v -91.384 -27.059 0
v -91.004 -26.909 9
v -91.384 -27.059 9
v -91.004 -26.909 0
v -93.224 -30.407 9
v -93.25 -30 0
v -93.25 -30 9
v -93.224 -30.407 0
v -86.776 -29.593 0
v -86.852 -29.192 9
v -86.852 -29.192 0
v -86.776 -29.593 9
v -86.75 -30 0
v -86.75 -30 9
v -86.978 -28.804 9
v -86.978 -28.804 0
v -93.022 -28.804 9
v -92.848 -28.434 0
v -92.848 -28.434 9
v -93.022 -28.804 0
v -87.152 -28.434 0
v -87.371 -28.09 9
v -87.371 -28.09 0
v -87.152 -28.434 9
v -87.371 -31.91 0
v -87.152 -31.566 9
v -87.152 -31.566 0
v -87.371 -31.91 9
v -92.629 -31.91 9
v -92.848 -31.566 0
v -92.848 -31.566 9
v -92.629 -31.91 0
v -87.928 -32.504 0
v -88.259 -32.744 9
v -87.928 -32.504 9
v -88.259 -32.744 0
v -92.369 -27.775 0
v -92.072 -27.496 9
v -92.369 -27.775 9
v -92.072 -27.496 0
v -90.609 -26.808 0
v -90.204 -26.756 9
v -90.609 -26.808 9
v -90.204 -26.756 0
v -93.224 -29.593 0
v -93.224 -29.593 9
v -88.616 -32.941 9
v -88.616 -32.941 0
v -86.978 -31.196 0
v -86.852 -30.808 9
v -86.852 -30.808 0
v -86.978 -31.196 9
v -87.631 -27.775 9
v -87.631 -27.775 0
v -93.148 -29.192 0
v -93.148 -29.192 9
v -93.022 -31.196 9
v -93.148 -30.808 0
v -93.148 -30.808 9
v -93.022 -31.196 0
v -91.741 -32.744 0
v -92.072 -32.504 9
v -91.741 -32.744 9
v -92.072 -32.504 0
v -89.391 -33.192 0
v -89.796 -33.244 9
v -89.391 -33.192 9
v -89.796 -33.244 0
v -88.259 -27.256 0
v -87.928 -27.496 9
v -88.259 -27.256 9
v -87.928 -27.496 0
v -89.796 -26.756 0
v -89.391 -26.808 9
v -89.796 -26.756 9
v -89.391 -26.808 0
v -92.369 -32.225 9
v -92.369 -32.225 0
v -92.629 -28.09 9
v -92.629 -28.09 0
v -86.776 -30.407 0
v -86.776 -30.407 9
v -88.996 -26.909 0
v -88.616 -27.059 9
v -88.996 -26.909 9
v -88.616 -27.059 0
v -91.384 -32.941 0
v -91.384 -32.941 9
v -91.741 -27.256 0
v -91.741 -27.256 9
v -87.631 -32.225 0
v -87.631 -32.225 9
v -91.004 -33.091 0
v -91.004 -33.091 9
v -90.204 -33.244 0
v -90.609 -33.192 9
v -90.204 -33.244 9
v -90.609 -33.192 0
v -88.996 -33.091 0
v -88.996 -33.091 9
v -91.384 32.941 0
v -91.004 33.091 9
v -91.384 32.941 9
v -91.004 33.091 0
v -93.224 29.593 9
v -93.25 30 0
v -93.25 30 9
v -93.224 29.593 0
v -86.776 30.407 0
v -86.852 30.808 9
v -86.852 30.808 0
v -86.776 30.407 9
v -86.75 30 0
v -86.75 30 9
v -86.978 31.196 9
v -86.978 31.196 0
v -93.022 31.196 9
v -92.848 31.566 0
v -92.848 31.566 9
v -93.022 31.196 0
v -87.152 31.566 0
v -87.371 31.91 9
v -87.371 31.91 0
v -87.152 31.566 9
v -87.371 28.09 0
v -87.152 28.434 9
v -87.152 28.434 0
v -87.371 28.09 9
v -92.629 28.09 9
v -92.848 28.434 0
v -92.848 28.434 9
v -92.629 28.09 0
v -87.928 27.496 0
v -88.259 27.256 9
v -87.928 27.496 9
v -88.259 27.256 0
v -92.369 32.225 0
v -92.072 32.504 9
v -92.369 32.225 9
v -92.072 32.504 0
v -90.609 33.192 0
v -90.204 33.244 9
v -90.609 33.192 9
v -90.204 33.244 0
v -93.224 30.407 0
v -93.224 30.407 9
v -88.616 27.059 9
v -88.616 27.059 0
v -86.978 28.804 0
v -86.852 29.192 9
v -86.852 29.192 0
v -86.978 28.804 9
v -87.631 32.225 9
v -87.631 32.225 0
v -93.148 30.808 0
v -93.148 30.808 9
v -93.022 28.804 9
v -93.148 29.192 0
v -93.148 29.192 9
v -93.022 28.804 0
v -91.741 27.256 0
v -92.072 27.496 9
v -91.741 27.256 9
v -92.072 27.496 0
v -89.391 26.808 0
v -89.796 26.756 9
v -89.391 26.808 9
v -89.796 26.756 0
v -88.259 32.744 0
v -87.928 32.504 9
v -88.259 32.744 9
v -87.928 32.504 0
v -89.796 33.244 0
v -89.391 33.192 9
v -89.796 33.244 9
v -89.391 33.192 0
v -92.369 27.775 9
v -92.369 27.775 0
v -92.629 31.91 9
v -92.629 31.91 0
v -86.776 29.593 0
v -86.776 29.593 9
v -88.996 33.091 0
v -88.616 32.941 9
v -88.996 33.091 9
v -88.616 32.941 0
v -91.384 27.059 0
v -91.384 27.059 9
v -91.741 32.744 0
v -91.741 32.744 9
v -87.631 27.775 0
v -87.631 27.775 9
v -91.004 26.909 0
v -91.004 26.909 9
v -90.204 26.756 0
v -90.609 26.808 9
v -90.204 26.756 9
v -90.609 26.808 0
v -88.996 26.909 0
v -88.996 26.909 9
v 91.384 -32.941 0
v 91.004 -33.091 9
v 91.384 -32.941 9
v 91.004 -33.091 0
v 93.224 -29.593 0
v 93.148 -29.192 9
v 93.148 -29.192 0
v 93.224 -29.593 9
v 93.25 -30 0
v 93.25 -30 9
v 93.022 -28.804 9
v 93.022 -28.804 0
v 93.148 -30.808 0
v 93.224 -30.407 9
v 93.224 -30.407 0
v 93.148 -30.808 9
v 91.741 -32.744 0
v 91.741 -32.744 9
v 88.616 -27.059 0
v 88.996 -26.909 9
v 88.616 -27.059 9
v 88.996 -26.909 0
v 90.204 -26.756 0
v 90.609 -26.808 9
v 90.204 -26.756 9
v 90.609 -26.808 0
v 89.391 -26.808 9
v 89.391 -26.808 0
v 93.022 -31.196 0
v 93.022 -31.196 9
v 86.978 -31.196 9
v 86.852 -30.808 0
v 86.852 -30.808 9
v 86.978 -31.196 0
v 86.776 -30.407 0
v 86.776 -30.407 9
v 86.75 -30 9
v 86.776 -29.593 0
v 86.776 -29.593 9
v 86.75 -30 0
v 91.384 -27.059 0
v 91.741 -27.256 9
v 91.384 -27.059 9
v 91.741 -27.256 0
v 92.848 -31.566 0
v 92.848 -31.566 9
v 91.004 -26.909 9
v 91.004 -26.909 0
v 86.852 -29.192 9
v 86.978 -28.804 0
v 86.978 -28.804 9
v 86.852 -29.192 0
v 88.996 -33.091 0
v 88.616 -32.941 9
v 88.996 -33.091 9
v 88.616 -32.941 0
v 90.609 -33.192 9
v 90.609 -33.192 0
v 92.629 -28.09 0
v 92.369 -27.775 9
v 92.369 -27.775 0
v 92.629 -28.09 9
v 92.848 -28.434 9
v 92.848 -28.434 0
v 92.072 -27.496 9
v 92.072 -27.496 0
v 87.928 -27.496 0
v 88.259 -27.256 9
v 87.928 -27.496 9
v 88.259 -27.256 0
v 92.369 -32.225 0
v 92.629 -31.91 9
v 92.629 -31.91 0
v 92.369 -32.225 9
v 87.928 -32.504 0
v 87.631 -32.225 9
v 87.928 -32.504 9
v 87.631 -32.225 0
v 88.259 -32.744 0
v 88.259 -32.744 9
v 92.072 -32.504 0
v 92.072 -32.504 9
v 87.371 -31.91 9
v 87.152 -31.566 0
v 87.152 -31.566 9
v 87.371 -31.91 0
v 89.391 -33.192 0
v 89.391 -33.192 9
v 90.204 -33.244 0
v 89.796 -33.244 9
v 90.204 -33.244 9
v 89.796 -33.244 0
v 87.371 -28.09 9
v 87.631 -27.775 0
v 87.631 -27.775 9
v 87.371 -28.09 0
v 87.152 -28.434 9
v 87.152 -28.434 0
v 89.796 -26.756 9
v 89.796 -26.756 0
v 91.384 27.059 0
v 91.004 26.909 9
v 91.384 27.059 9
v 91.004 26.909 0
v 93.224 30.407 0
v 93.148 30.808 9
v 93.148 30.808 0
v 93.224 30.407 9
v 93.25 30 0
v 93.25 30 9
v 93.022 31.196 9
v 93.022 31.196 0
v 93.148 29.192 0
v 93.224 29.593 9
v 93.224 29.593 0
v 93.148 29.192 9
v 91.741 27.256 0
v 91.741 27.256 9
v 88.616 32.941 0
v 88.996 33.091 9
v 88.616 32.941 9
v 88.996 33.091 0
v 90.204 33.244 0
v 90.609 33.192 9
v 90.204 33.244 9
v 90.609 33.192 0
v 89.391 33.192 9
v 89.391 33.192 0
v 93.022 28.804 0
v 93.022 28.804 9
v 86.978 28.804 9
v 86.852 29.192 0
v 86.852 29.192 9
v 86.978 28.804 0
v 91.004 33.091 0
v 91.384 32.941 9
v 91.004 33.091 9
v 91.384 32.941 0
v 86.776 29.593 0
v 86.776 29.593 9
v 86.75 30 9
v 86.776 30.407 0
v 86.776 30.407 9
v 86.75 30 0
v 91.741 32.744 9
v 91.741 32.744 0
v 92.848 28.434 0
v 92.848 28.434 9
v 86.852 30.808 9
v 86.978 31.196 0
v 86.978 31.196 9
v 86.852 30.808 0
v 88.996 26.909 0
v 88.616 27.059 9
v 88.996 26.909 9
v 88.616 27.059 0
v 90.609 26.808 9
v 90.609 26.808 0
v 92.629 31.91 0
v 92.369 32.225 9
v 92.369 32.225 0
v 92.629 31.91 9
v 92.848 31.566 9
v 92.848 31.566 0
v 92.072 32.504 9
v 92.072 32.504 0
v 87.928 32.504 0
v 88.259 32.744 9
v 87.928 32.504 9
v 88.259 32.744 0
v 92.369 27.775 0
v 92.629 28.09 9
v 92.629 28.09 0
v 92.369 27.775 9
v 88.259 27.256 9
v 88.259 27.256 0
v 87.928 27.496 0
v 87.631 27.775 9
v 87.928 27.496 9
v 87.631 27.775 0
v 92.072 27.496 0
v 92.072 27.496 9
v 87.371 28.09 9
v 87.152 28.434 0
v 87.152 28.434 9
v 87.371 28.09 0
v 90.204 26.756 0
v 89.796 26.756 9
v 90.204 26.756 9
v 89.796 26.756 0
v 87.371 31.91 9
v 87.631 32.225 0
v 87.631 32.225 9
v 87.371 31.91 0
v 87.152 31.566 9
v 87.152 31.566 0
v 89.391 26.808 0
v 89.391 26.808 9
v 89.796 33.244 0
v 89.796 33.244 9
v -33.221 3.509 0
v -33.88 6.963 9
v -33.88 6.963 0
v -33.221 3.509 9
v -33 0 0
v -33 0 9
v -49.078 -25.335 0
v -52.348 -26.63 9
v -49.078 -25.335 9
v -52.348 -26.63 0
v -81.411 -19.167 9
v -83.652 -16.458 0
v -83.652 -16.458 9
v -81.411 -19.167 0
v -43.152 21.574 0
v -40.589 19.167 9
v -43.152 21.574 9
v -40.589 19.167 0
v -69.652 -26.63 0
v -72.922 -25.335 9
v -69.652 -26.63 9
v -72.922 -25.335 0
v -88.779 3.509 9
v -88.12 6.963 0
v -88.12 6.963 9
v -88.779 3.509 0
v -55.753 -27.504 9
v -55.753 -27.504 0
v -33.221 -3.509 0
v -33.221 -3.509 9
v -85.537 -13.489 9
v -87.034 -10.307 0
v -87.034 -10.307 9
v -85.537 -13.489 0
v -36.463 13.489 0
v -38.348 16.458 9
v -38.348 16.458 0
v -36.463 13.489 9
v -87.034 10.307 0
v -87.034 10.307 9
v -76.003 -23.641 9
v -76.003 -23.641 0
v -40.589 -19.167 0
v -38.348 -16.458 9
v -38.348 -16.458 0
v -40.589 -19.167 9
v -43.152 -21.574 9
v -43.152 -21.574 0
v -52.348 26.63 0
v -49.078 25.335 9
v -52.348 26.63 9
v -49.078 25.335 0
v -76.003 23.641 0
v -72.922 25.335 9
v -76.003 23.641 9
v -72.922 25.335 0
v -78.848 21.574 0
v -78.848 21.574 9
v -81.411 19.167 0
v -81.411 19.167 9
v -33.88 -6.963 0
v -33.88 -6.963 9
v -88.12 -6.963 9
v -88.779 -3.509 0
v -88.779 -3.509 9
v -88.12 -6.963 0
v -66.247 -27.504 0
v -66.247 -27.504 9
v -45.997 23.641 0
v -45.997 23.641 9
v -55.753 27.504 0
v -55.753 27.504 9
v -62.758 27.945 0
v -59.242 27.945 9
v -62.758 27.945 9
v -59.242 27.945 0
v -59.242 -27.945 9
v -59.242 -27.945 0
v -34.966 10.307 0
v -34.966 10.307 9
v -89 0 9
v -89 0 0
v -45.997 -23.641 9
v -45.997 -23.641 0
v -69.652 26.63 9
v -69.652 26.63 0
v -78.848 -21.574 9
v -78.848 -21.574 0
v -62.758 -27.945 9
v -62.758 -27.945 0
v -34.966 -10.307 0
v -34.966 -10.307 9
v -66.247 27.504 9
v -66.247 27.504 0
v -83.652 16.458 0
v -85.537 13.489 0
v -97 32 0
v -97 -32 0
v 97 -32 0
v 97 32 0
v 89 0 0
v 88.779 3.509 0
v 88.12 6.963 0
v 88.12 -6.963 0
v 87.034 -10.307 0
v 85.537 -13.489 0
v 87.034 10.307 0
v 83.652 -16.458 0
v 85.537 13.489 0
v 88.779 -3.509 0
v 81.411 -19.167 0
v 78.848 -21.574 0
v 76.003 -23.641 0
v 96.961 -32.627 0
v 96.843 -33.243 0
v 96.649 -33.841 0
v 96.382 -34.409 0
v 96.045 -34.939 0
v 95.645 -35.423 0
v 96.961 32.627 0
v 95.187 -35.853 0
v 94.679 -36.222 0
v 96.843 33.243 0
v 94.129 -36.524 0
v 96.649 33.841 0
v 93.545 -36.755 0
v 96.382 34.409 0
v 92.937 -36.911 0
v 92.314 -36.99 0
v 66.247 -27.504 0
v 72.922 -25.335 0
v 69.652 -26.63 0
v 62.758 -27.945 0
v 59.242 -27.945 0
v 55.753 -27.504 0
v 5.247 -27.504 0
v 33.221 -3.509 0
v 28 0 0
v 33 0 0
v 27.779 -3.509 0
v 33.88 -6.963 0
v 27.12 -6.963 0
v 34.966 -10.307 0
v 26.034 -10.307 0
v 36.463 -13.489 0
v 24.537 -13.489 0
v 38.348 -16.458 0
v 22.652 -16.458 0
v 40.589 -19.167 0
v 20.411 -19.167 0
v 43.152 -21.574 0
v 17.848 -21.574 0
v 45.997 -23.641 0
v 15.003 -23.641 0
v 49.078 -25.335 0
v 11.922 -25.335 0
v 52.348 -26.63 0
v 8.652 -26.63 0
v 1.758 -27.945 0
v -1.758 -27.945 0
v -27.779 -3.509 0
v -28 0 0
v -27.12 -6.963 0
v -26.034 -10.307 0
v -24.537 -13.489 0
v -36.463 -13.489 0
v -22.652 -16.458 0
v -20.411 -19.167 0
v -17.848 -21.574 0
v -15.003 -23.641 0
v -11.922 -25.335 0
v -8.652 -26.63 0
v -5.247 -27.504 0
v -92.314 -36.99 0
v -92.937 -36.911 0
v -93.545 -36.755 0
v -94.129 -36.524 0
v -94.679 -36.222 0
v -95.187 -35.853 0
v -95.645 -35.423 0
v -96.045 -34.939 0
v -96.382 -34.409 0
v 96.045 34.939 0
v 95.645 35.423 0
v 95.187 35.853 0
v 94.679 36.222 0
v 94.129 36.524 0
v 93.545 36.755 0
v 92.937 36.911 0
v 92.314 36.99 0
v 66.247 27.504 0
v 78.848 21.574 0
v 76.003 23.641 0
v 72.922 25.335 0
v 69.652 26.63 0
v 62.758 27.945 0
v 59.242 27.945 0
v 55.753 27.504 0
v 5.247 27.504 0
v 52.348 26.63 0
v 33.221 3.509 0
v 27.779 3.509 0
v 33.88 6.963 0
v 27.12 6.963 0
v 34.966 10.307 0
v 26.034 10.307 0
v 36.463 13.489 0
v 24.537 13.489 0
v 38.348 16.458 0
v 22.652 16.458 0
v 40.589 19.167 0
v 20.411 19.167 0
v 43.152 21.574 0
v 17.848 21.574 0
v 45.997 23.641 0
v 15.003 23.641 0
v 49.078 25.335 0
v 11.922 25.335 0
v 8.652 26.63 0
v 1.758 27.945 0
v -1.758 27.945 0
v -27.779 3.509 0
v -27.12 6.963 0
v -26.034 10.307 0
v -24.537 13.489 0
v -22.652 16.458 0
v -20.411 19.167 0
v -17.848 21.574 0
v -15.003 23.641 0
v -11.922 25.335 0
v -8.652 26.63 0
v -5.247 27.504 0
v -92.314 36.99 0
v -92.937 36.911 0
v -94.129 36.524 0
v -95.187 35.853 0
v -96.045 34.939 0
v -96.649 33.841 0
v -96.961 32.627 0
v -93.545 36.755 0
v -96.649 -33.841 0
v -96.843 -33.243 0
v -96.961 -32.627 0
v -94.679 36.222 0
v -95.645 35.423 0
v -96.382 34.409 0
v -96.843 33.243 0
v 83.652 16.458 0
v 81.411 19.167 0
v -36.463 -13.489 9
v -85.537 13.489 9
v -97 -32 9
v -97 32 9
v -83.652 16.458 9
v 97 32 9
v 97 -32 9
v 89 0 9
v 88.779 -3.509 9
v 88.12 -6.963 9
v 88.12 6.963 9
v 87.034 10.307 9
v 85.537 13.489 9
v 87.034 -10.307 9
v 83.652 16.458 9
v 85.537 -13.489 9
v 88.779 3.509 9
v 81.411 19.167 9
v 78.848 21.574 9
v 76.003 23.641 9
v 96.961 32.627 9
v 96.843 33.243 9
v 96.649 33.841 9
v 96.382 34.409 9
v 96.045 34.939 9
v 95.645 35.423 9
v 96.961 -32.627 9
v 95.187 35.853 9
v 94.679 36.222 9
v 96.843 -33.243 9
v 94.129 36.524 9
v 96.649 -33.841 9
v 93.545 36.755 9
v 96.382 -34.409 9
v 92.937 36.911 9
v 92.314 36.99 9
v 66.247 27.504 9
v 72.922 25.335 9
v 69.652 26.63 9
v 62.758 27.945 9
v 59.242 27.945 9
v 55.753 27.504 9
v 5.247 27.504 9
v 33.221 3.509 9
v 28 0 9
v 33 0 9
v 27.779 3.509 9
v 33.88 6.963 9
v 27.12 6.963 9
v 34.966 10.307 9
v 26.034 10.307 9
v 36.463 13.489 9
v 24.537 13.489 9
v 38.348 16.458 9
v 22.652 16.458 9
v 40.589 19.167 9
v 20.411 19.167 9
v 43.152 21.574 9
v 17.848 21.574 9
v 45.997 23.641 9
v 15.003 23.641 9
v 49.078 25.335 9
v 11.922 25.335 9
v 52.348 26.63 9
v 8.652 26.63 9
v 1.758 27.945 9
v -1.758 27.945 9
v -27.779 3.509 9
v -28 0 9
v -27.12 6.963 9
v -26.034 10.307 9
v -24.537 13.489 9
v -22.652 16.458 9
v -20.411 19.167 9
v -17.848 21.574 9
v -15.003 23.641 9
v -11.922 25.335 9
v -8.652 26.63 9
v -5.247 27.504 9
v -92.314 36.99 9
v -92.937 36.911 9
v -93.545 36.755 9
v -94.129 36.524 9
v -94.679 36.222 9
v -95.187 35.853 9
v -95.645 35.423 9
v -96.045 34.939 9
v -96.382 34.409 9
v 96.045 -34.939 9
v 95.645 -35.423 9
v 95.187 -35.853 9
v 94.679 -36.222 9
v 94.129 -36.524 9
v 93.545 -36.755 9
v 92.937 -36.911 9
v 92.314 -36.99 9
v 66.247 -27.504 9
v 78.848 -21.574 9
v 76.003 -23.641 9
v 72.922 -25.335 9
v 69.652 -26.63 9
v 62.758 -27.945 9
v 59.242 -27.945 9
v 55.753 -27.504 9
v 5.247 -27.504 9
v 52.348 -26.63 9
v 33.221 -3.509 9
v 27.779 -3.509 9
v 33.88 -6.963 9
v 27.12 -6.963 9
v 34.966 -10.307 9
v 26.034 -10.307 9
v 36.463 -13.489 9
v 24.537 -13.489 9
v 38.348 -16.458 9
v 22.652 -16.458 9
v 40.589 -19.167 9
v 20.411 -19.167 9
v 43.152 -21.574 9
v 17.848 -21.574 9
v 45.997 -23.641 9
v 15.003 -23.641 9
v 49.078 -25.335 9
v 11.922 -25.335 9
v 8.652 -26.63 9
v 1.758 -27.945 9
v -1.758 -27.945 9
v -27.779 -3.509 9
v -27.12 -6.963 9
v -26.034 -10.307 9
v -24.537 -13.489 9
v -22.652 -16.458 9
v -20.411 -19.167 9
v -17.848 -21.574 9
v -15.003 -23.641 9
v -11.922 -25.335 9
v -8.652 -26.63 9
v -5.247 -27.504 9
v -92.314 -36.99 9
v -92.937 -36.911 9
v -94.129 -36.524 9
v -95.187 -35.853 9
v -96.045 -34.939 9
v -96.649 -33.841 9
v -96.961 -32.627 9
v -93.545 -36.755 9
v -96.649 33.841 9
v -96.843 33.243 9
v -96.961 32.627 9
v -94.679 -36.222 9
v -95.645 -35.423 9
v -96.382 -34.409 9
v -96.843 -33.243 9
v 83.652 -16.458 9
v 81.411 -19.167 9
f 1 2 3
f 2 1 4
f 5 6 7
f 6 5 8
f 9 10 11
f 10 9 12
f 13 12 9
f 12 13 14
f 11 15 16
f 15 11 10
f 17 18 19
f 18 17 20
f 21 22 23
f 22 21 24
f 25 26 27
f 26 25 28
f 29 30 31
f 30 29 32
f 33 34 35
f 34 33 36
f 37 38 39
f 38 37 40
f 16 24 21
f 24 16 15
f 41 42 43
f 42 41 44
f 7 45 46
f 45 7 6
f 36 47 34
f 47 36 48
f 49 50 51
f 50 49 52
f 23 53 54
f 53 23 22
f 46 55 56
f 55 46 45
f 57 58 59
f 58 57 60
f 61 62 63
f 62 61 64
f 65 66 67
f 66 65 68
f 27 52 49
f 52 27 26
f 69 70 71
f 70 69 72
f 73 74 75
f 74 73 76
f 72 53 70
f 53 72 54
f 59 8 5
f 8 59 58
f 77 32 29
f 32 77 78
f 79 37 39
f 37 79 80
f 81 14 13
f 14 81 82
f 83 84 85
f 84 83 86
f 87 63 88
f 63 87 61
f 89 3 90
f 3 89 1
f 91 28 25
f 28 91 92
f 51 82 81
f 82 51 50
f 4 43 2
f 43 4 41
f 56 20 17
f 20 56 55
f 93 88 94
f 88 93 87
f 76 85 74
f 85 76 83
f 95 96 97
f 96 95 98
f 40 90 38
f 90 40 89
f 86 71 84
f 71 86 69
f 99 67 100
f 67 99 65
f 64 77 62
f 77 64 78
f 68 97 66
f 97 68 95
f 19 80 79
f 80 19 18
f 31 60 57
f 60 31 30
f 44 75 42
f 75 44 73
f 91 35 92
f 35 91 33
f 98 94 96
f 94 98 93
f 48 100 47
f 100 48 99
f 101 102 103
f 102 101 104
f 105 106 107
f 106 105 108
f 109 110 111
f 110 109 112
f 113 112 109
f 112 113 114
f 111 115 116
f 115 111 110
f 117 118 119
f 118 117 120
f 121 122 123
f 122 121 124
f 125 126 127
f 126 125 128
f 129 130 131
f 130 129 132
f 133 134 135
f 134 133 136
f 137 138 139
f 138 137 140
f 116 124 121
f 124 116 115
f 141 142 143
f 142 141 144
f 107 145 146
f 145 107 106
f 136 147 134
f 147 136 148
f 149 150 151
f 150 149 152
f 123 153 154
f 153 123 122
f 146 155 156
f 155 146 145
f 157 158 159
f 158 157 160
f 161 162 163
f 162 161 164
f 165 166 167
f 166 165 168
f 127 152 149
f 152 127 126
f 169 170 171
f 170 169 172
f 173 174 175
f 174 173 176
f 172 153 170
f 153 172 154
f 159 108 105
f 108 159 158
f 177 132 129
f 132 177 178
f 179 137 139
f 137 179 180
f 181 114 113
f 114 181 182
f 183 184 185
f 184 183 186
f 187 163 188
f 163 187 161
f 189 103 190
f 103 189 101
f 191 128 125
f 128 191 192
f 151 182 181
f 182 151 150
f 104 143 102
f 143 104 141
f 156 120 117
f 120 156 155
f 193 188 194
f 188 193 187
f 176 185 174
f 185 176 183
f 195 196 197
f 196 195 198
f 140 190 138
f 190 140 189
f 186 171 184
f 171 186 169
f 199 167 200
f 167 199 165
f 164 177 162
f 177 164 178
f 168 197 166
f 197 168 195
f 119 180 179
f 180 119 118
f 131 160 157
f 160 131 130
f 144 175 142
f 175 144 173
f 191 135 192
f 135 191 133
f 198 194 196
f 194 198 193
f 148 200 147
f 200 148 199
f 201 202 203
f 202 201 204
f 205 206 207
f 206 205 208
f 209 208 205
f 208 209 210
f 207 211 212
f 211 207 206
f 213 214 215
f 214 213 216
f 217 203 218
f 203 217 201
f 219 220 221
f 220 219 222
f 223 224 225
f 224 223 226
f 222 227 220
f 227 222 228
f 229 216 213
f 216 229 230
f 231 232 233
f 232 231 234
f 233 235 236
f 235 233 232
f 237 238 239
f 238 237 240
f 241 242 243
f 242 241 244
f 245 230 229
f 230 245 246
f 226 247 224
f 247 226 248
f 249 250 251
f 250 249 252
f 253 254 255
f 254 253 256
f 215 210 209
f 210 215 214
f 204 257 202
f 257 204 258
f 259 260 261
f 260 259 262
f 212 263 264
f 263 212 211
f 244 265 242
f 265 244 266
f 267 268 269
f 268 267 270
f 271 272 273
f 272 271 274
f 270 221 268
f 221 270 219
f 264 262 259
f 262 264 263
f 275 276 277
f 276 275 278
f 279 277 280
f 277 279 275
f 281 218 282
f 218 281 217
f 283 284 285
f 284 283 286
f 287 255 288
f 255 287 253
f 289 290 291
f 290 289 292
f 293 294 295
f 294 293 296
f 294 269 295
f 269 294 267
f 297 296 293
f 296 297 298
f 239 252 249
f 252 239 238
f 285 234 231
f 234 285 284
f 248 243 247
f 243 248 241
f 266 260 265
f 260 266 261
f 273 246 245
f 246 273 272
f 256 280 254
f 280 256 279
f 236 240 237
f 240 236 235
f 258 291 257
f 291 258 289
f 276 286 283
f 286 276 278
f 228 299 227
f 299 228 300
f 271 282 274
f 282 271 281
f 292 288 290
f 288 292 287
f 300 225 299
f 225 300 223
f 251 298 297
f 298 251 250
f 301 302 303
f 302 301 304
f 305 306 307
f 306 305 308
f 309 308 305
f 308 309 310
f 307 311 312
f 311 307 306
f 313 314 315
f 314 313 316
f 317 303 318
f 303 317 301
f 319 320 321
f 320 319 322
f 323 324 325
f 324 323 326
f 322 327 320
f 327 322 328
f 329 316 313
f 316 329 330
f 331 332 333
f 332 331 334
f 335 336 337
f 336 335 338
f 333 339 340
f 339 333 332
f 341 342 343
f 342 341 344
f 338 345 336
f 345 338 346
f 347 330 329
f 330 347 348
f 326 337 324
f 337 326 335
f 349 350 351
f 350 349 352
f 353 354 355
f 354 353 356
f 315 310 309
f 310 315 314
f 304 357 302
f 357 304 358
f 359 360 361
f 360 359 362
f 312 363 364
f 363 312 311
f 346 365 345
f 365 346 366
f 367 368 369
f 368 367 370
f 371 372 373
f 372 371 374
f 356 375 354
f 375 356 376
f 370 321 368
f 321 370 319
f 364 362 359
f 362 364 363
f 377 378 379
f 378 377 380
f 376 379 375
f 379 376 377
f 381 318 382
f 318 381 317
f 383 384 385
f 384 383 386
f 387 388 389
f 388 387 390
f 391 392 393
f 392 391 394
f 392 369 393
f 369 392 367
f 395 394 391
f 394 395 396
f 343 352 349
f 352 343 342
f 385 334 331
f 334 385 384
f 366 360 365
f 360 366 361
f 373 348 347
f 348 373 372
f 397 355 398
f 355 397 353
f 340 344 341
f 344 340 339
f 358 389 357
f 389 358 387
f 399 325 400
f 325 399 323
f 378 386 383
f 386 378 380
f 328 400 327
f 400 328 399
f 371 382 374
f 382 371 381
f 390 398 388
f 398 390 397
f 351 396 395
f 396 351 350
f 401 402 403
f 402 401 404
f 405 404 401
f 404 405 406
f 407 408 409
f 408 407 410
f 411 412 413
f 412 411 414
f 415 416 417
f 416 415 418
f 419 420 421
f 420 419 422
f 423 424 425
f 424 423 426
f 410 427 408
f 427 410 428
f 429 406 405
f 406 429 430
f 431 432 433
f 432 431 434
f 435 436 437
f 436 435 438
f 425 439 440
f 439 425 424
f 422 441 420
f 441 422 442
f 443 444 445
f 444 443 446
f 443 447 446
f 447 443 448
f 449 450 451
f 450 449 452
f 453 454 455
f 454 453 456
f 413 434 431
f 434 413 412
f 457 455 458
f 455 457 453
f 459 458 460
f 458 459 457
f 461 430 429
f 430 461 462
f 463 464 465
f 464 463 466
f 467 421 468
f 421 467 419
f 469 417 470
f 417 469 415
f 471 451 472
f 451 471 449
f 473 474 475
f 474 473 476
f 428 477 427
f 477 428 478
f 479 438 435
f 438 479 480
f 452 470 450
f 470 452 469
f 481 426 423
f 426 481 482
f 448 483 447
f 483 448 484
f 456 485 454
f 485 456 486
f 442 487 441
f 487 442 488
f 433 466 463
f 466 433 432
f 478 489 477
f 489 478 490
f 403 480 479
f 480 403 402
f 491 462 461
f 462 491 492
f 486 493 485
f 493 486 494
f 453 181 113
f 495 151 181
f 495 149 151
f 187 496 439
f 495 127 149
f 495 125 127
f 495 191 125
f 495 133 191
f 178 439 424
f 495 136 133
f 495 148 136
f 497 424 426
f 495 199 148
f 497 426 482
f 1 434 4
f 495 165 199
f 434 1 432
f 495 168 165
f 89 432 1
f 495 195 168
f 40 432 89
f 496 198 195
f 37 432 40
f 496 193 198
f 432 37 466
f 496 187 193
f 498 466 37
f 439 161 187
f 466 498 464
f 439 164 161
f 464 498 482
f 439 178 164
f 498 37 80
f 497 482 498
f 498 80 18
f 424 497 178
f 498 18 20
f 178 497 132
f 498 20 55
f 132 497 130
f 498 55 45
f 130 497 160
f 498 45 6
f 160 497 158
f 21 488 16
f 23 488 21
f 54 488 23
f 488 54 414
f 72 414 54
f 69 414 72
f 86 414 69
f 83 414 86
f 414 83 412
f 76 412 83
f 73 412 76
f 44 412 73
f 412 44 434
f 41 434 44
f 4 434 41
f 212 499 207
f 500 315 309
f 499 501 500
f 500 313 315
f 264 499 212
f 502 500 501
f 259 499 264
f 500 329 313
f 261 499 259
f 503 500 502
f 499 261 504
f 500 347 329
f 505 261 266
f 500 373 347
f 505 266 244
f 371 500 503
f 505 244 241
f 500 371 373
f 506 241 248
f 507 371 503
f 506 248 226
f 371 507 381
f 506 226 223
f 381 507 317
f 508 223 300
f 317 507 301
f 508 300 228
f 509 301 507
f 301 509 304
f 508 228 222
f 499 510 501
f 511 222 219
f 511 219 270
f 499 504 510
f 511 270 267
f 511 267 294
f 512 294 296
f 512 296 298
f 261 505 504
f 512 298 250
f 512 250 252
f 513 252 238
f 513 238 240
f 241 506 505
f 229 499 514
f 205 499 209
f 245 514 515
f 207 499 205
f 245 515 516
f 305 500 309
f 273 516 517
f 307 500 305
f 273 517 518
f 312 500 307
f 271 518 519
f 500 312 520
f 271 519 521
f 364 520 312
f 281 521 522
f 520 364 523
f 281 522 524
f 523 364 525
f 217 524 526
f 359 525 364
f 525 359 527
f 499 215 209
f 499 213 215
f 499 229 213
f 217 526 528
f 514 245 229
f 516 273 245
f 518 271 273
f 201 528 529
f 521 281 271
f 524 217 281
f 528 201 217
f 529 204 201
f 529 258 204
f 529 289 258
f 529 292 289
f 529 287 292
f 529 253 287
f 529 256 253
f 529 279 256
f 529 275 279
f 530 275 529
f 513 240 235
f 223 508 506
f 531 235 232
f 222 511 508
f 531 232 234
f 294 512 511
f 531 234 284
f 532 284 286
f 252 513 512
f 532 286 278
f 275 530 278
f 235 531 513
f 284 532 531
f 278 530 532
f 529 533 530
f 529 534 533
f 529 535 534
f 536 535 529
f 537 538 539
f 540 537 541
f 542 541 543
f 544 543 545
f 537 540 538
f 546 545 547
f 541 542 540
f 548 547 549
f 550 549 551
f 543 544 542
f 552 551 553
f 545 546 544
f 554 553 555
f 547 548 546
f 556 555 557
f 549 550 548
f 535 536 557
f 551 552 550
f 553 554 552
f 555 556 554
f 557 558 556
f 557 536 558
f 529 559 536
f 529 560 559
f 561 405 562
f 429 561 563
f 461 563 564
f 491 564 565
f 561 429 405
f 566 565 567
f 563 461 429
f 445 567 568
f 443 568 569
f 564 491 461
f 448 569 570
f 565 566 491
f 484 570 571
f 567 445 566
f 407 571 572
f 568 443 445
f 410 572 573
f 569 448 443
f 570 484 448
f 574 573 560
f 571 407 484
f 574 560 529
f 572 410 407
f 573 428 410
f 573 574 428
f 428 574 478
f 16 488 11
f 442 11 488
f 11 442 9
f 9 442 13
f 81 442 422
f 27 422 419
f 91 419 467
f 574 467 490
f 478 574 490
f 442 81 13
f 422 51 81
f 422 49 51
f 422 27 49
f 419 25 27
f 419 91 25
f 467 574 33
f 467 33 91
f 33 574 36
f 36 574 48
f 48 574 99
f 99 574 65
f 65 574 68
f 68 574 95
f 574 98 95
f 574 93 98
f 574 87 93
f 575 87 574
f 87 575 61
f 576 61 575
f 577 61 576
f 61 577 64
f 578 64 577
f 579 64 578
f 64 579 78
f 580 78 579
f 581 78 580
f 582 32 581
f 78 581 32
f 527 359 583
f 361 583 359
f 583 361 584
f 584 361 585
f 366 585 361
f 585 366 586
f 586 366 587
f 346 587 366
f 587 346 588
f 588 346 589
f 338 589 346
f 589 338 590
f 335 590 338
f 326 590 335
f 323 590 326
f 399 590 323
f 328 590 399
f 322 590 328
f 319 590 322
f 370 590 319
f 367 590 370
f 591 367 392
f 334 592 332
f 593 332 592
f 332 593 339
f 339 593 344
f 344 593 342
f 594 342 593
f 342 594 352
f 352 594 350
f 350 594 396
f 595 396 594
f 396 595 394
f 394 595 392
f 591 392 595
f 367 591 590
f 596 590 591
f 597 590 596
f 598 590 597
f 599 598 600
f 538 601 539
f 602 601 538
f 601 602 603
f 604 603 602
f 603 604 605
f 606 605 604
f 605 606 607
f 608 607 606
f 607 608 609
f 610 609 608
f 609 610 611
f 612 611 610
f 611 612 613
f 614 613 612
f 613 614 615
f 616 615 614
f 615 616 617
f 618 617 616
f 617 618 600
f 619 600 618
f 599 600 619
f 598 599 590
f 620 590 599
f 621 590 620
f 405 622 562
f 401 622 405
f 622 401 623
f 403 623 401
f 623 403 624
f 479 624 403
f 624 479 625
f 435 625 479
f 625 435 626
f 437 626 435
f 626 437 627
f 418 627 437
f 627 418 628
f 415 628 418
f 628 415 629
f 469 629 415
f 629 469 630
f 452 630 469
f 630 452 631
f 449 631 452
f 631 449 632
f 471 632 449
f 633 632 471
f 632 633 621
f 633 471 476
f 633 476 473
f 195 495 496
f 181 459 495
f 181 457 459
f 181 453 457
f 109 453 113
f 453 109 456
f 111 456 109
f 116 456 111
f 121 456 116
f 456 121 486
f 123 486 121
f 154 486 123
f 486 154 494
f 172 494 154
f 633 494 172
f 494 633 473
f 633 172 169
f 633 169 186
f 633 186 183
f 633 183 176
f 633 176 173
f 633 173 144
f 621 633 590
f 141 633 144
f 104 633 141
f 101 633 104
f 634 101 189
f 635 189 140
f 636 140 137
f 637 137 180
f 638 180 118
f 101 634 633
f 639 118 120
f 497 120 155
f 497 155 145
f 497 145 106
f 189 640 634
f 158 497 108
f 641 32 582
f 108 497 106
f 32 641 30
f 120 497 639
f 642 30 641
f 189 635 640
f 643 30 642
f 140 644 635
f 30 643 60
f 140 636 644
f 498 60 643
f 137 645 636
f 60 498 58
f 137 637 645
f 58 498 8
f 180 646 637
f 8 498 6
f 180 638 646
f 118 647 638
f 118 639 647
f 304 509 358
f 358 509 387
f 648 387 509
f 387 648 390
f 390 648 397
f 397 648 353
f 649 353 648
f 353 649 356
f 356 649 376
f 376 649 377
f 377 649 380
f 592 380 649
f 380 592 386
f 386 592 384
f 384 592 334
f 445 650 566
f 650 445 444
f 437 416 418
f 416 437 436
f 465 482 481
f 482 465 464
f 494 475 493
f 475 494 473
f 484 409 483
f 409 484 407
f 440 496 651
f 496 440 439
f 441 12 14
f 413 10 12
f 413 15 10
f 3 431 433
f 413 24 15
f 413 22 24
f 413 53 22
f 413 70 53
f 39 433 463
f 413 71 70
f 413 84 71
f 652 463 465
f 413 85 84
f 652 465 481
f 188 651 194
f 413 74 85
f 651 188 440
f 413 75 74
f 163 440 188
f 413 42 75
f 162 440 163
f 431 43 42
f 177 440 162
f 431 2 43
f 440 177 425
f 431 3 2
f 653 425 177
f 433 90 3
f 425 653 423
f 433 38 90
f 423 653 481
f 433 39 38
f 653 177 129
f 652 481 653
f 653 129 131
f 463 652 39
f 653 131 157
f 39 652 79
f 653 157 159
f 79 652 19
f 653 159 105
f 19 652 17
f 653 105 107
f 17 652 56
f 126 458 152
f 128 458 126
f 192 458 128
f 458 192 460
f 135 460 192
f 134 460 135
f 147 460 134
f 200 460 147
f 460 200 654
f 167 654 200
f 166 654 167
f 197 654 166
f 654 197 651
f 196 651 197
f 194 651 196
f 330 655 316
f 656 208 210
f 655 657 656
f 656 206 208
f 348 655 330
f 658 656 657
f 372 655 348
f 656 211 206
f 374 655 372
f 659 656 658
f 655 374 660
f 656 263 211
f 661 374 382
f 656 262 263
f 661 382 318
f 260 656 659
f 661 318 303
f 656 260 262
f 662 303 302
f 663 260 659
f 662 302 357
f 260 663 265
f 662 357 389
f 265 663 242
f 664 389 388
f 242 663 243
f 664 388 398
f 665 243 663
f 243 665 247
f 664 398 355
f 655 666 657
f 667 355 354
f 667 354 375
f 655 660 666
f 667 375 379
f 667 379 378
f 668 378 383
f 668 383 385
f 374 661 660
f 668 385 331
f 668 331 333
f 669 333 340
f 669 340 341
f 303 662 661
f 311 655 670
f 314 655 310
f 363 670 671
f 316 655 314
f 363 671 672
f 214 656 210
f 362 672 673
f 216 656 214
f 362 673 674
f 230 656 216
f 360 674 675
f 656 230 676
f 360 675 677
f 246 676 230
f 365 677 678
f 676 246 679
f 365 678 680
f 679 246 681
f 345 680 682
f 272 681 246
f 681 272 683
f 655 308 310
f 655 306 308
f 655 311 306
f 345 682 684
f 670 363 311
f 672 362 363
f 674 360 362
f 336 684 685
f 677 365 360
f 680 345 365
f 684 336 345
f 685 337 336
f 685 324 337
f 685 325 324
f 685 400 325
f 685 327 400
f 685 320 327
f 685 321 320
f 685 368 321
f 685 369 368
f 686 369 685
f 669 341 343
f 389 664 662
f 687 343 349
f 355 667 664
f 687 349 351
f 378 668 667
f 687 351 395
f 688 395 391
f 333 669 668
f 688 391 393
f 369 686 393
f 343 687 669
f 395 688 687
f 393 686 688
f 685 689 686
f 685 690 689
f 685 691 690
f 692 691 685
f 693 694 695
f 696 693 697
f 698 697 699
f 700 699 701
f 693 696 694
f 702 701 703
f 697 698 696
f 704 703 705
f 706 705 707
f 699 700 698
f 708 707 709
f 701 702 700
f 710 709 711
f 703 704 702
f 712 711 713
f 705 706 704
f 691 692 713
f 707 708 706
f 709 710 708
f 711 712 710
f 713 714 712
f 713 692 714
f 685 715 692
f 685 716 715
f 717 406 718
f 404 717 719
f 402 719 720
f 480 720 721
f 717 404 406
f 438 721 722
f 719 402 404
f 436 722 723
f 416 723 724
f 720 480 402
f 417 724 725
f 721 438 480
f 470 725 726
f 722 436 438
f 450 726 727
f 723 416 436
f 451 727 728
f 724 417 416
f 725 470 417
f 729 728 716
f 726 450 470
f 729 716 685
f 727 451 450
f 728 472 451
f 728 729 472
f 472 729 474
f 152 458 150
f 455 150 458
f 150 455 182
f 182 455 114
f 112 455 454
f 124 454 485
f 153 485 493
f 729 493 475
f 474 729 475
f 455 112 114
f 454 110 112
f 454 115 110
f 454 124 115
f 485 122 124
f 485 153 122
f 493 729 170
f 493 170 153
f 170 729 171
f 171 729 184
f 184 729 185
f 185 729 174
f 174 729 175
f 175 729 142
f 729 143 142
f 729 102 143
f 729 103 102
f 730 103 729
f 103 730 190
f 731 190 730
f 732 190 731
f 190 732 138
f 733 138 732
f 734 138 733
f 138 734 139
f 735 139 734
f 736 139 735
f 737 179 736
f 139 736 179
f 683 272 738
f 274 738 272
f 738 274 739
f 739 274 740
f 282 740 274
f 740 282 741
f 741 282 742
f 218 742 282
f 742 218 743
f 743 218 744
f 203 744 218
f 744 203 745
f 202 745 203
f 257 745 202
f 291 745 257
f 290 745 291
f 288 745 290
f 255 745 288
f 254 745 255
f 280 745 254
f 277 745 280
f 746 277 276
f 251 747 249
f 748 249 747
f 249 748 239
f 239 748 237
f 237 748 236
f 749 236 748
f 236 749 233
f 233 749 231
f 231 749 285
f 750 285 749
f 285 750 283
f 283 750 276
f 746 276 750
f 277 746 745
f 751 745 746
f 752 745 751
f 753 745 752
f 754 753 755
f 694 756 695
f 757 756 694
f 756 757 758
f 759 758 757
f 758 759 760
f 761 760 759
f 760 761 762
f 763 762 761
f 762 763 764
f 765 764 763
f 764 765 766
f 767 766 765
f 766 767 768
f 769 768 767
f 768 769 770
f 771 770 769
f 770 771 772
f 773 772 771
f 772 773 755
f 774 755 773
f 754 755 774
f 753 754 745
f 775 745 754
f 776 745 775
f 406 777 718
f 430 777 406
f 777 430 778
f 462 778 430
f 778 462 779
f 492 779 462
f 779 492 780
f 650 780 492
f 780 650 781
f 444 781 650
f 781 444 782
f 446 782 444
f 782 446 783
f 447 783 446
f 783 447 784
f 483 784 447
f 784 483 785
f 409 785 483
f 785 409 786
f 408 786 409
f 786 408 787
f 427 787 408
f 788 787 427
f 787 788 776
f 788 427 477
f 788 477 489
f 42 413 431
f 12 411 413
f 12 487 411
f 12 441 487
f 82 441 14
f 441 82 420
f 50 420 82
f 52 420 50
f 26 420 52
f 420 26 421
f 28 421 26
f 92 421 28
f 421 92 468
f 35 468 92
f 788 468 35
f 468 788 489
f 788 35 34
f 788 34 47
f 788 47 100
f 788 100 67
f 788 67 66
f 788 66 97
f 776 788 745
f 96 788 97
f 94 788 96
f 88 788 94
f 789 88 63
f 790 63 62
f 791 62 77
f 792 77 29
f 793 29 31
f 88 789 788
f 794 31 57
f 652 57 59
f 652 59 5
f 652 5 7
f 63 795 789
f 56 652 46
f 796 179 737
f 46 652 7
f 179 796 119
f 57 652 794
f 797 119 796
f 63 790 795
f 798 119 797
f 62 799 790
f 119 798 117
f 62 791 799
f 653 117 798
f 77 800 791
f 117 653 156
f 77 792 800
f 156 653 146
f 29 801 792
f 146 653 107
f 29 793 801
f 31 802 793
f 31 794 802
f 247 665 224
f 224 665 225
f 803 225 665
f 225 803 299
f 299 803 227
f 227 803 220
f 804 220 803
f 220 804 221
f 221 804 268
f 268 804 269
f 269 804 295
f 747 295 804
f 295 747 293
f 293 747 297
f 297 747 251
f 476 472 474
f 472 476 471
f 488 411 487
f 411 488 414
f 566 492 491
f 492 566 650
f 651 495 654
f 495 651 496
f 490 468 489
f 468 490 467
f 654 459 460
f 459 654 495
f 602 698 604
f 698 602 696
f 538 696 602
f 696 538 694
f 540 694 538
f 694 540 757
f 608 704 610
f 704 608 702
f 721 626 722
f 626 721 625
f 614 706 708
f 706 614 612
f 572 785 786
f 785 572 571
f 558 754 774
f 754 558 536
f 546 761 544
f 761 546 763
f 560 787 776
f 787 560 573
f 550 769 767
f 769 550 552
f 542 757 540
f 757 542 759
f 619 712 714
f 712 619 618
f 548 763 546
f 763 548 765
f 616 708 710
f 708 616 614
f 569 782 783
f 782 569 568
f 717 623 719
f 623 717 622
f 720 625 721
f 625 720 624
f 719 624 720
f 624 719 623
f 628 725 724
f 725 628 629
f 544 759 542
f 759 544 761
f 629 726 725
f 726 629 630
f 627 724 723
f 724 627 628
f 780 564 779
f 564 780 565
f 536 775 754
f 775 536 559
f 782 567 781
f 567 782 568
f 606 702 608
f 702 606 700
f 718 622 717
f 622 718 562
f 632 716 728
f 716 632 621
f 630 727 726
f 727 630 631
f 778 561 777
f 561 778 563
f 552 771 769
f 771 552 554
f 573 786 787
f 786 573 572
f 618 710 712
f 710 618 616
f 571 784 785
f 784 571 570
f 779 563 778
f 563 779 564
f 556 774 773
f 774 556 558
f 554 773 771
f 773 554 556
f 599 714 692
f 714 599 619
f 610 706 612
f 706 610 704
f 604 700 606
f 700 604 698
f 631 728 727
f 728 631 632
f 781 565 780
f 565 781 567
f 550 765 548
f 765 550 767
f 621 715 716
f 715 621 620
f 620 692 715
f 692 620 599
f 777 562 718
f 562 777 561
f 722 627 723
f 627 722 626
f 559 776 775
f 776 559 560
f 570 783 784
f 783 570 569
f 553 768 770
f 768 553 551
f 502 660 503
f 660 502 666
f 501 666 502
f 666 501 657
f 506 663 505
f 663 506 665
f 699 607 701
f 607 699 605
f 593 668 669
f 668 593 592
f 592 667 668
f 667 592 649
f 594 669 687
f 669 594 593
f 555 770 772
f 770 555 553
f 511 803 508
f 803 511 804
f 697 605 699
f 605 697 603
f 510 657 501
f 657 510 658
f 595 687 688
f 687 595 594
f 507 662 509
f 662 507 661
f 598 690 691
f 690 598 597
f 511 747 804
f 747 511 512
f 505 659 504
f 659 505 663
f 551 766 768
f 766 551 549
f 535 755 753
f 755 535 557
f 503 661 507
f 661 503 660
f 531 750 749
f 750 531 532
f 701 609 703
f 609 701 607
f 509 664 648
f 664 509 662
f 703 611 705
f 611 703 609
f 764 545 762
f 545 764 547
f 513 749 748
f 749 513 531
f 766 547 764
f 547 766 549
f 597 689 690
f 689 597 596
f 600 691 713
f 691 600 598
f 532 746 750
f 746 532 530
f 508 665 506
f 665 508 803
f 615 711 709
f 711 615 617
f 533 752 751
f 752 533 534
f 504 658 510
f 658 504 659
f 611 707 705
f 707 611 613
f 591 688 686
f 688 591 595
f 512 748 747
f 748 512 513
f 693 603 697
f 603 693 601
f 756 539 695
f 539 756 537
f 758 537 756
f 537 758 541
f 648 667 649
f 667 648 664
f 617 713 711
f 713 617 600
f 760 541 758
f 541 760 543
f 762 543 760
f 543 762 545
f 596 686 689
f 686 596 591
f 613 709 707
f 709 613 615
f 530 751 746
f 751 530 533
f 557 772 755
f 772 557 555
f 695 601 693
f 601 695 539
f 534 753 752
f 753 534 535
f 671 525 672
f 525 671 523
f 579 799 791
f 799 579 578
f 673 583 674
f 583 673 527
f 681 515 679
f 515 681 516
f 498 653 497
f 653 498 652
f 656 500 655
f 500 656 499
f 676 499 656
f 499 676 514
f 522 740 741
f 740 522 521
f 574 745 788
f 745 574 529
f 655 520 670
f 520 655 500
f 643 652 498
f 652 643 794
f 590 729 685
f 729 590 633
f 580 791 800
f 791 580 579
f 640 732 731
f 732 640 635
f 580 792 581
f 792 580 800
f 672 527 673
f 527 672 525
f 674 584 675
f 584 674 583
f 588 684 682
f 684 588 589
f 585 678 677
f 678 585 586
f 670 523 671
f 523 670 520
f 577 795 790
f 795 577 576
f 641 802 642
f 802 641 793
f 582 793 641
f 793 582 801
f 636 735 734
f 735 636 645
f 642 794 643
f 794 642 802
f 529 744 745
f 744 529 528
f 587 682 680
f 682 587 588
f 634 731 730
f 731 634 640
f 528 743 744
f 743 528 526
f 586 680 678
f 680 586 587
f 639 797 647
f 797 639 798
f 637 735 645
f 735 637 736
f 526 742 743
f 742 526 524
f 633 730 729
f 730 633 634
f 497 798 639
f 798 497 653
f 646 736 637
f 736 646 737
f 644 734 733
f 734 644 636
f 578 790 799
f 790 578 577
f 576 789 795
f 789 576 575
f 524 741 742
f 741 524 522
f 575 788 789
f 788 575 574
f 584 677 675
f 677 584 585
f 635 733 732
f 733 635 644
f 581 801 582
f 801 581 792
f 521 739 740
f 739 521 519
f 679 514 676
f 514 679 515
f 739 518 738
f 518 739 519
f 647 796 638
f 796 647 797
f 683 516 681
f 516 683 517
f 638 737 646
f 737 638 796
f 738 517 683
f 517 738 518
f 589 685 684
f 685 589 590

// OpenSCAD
$fn = 50;


difference() {
	union() {
		hull() {
			translate(v = [-92.0000000000, 32.0000000000, 0]) {
				cylinder(h = 9, r = 5);
			}
			translate(v = [92.0000000000, 32.0000000000, 0]) {
				cylinder(h = 9, r = 5);
			}
			translate(v = [-92.0000000000, -32.0000000000, 0]) {
				cylinder(h = 9, r = 5);
			}
			translate(v = [92.0000000000, -32.0000000000, 0]) {
				cylinder(h = 9, r = 5);
			}
		}
	}
	union() {
		#translate(v = [-90.0000000000, -30.0000000000, -100.0000000000]) {
			cylinder(h = 200, r = 3.2500000000);
		}
		#translate(v = [-90.0000000000, 30.0000000000, -100.0000000000]) {
			cylinder(h = 200, r = 3.2500000000);
		}
		#translate(v = [90.0000000000, -30.0000000000, -100.0000000000]) {
			cylinder(h = 200, r = 3.2500000000);
		}
		#translate(v = [90.0000000000, 30.0000000000, -100.0000000000]) {
			cylinder(h = 200, r = 3.2500000000);
		}
		#translate(v = [-61.0000000000, 0, 0]) {
			cylinder(h = 9, r = 28.0000000000);
		}
		#cylinder(h = 9, r = 28.0000000000);
		#translate(v = [61.0000000000, 0, 0]) {
			cylinder(h = 9, r = 28.0000000000);
		}
	}
}
